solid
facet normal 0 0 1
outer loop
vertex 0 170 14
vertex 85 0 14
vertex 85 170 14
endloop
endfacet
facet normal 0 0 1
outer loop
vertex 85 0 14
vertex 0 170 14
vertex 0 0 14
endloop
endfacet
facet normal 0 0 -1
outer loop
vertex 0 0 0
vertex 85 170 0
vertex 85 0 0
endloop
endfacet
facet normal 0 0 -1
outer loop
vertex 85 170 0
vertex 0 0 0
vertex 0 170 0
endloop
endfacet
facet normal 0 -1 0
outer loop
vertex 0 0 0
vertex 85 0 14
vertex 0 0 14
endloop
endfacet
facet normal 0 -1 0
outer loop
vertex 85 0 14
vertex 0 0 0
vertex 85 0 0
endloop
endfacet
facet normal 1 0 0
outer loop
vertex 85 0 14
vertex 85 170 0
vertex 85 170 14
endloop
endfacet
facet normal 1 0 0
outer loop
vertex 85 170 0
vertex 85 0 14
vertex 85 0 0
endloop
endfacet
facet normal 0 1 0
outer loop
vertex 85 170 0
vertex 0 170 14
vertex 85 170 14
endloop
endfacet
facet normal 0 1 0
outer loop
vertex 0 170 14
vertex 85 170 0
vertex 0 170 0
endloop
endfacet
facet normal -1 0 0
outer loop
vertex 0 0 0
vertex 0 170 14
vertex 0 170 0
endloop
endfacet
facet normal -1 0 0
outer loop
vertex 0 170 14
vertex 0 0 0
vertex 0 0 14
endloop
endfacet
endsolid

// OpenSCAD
// Concept only. Provisional dimensions in mm.
$fn=32;
cube([85,170,14]);
